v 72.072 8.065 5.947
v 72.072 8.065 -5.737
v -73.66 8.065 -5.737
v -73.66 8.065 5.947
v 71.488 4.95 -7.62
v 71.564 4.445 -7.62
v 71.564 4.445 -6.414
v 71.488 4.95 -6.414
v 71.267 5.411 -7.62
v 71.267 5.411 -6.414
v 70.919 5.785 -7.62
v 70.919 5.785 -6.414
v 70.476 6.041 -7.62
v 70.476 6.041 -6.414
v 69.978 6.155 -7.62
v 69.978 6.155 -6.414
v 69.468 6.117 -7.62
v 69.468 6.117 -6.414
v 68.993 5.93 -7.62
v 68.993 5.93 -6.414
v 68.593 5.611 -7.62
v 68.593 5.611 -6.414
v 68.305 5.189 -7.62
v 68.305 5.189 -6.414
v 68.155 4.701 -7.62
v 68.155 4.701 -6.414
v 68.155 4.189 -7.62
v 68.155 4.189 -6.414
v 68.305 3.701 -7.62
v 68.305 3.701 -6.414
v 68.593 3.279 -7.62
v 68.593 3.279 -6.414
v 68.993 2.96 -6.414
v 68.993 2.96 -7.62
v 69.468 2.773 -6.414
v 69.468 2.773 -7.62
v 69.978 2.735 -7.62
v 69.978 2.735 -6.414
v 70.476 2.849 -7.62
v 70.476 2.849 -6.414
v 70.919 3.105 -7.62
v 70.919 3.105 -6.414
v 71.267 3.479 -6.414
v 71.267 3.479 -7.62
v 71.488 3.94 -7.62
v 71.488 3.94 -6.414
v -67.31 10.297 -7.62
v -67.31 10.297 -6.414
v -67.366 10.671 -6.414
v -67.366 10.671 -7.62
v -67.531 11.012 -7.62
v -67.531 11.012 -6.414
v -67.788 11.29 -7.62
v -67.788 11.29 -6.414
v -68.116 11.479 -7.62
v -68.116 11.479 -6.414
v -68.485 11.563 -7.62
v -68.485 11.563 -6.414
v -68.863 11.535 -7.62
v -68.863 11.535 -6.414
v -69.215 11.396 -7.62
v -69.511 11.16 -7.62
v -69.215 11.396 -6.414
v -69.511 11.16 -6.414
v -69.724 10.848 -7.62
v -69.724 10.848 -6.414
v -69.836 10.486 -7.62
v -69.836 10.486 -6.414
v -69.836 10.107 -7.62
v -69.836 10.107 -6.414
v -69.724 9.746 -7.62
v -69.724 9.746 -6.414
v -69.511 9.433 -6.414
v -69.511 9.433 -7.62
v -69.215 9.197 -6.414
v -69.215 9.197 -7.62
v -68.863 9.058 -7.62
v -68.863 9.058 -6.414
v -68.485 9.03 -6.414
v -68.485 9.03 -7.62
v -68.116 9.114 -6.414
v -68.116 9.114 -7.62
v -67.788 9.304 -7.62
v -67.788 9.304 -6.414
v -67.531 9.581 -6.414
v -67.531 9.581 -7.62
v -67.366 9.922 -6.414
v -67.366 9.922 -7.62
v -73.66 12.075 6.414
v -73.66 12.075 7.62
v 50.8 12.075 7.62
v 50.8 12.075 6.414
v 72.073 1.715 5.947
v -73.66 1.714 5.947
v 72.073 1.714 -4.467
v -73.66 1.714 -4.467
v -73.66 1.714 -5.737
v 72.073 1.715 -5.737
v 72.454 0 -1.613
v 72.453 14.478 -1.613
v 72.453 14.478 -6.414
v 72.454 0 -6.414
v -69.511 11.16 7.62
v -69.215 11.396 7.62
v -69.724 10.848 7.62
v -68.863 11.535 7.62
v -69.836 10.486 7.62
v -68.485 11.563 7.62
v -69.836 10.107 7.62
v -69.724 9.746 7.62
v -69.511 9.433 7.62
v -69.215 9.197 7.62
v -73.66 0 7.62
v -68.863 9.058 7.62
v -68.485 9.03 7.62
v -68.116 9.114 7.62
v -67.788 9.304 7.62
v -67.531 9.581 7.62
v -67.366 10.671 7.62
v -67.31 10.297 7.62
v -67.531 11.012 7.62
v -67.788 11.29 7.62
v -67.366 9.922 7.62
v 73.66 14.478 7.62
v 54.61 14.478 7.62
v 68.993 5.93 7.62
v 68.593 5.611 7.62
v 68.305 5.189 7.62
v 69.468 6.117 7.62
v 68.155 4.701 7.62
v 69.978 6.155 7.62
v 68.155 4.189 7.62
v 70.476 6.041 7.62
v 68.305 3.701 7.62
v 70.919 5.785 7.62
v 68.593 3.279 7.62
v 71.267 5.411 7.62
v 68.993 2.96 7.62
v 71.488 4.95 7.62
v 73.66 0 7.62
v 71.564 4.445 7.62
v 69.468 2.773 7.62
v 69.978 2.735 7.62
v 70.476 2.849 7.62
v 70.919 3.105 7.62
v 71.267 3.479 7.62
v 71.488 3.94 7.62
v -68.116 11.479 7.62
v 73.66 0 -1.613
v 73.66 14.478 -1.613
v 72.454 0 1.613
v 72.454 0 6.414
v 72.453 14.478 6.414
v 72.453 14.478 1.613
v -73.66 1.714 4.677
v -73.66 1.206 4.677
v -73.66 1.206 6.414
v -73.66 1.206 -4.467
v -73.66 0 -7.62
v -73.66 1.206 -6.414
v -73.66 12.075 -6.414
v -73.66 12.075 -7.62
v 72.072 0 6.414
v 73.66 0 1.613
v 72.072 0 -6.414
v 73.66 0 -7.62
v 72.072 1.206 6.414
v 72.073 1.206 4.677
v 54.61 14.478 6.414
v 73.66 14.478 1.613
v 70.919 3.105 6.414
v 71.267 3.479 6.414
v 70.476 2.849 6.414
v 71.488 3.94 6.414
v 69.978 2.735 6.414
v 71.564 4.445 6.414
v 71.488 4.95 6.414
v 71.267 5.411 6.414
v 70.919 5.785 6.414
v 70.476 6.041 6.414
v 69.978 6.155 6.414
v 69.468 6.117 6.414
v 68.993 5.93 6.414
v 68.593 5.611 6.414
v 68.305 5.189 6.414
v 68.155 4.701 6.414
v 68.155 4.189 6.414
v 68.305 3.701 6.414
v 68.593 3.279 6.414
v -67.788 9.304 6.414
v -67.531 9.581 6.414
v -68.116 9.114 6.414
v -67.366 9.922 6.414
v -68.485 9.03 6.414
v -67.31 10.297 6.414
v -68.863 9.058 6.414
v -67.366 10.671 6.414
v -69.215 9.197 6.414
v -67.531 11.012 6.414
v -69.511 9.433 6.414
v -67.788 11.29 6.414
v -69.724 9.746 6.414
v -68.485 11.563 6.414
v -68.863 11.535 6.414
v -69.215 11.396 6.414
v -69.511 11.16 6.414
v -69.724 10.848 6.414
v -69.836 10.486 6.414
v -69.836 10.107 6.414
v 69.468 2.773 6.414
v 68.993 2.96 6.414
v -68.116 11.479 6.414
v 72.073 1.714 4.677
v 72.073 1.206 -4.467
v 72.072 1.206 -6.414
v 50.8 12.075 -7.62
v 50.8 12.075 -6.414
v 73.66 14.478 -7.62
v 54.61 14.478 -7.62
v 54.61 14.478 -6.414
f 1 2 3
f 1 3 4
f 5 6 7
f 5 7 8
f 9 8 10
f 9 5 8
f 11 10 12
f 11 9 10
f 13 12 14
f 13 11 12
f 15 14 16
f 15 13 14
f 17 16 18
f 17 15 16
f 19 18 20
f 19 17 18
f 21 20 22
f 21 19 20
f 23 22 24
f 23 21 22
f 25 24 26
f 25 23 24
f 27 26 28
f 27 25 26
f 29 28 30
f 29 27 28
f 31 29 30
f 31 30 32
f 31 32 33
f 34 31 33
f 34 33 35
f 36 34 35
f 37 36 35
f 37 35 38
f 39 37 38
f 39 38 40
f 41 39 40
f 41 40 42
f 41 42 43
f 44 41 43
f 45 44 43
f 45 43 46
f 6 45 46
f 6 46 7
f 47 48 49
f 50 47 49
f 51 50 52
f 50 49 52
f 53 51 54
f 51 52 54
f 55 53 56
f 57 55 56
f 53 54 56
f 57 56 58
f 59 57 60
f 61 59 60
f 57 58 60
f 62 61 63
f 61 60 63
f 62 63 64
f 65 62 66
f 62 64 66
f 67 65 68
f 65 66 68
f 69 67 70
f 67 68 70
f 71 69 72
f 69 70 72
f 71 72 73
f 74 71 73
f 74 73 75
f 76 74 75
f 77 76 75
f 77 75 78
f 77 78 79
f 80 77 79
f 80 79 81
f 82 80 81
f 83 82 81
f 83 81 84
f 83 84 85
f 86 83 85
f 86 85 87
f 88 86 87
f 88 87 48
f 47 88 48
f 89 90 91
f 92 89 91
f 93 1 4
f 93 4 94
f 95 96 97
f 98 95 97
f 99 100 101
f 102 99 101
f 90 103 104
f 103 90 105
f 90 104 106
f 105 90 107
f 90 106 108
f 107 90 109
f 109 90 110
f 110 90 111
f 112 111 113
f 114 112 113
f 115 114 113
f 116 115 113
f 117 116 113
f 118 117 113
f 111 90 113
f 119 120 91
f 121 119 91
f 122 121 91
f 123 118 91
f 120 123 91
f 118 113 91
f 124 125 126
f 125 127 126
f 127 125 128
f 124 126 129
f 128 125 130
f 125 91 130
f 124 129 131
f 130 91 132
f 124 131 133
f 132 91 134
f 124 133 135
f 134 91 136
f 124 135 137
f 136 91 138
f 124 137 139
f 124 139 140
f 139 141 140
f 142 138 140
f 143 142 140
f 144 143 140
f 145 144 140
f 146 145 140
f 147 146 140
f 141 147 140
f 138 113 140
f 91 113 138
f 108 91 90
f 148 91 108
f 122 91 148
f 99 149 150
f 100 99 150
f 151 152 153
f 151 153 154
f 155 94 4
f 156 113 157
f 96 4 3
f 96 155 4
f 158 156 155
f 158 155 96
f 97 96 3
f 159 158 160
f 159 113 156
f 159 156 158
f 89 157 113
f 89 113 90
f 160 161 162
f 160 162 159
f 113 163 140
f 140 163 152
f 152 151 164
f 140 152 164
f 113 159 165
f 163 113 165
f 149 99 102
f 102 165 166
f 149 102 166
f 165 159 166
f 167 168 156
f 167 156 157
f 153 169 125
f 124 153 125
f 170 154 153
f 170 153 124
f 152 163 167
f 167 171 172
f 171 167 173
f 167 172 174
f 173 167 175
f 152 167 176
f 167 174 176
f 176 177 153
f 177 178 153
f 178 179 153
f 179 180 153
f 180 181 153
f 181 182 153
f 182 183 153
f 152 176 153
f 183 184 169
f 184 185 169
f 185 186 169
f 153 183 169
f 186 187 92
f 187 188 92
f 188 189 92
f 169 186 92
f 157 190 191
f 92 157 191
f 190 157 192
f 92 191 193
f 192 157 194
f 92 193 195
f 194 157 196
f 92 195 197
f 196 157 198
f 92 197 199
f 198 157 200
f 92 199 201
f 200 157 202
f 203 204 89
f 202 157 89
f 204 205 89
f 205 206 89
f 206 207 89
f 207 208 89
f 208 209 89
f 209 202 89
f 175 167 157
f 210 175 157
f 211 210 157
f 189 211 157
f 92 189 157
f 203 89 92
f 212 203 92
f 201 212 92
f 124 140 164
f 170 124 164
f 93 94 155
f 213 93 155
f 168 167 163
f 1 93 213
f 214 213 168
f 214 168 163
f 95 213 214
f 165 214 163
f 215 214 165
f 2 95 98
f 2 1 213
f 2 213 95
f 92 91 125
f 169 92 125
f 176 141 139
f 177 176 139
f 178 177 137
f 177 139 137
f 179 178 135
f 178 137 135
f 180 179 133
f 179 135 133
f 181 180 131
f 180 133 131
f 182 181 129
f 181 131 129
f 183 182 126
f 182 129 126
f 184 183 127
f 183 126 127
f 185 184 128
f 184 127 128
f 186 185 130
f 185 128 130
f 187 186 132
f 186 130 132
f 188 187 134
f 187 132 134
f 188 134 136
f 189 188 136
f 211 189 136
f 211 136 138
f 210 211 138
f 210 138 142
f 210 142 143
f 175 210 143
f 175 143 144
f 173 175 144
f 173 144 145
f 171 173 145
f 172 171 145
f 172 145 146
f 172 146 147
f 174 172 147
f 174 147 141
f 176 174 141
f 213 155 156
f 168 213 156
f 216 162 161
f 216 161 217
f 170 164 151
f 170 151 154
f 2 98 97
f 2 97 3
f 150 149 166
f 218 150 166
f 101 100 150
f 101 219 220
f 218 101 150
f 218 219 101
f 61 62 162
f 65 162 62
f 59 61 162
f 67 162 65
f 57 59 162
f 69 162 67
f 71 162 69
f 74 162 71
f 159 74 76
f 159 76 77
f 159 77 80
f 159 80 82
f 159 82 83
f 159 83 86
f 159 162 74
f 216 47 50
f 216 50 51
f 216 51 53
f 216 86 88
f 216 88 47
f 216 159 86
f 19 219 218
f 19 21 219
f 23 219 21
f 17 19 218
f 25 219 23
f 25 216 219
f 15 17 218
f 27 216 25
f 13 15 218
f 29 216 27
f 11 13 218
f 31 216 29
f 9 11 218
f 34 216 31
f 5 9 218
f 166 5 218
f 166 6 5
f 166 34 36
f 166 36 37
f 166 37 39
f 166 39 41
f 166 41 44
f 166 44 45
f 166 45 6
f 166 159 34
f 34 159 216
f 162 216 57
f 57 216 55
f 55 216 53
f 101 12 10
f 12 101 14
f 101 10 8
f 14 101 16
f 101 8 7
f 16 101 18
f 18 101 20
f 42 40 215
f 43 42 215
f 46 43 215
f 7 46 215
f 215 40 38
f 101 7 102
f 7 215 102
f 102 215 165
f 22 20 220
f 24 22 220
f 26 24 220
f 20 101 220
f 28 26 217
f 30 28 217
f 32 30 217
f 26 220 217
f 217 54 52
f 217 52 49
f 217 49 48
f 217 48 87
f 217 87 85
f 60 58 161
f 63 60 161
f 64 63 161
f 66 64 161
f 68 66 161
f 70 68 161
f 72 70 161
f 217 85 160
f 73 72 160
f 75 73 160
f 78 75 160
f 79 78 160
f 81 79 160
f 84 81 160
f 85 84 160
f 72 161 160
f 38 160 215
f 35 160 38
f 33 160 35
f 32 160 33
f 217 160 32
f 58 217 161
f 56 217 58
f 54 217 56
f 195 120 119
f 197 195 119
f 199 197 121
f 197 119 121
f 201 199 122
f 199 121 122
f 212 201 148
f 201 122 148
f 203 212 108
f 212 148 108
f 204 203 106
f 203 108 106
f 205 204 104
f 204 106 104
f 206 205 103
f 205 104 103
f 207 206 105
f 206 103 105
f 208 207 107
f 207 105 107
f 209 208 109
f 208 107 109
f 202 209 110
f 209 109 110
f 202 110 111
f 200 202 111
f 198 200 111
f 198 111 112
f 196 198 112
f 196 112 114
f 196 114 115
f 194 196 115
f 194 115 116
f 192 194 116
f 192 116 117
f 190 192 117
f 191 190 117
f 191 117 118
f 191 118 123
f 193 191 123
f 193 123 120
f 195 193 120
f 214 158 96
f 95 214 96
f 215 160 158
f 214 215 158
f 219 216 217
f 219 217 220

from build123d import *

# Parameters (mm, degrees)
SKETCH1_W           = 147.32
SKETCH1_H           = 15.24
BOSS_EXTRUDE1_DEPTH = 14.478
CUT_EXTRUDE2_DEPTH  = 146.1135
CUT_EXTRUDE5_REACH  = 78.601
SKETCH7_R           = 1.7145
SKETCH9_R           = 1.27
CUT_EXTRUDE6_DEPTH  = 77.60068984
CUT_EXTRUDE7_REACH  = 76.491
SKETCH11_W          = 0.381
SKETCH11_H          = 11.684
CUT_EXTRUDE8_REACH  = 77.233
SKETCH12_W          = 0.381
SKETCH12_H          = 0.676587602
CUT_EXTRUDE9_REACH  = 77.233
SKETCH13_W          = 0.381
SKETCH13_H          = 0.466412398
CUT_EXTRUDE10_REACH = 150.226
SKETCH14_W          = 1.6129
SKETCH14_H          = 14.478


with BuildPart() as part:
    # Sketch1 → Boss-Extrude1 (new body)
    with BuildSketch(Plane(origin=(0, 0, 0), x_dir=(1, 0, 0), z_dir=(0, 1, 0))):
        Rectangle(SKETCH1_W, SKETCH1_H)
    extrude(amount=BOSS_EXTRUDE1_DEPTH)

    # Sketch3 → Cut-Extrude2 (cut)
    with BuildSketch(Plane.ZY.offset(73.66)):
        Polygon((-6.4135, 14.478), (-6.4135, 13.2715), (-6.4135, 1.2065), (-4.466912398, 1.2065), (-4.466912398, 1.7145), (-5.736912398, 1.7145), (-5.736912398, 8.0645), (5.947087602, 8.0645), (5.947087602, 1.7145), (4.677087602, 1.7145), (4.677087602, 1.2065), (6.4135, 1.2065), (6.4135, 13.2715), (6.4135, 14.478), align=None)
    extrude(amount=-CUT_EXTRUDE2_DEPTH, mode=Mode.SUBTRACT)

    # Sketch7 → Cut-Extrude5 (cut, up to next)
    with BuildSketch(Plane.XY.offset(7.62), mode=Mode.PRIVATE) as cut_extrude5_sk1:
        Polygon((50.8, 12.074646248), (54.61, 14.478), (-73.66, 14.478), (-73.66, 12.074646248), align=None)
    cut_extrude5_tool1 = extrude(cut_extrude5_sk1.sketch, amount=-CUT_EXTRUDE5_REACH, mode=Mode.PRIVATE) & part.part
    # Sketch7 → Cut-Extrude5 (cut, up to next)
    with BuildSketch(Plane.XY.offset(7.62), mode=Mode.PRIVATE) as cut_extrude5_sk2:
        with Locations((69.85, 4.445)):
            Circle(SKETCH7_R)
    cut_extrude5_tool2 = extrude(cut_extrude5_sk2.sketch, amount=-CUT_EXTRUDE5_REACH, mode=Mode.PRIVATE) & part.part
    cut_extrude5_1 = cut_extrude5_tool1.solids().sort_by_distance((-10.472714, 13.282362, 7.62))[0]
    add(cut_extrude5_1, mode=Mode.SUBTRACT)
    cut_extrude5_2 = cut_extrude5_tool2.solids().sort_by_distance((69.85, 4.445, 7.62))[0]
    add(cut_extrude5_2, mode=Mode.SUBTRACT)
    cut_extrude5 = cut_extrude5_1 + cut_extrude5_2  # Cut-Extrude5 as one shape, for the pattern or mirror that repeats it

    # Sketch9 → Cut-Extrude6 (cut, through all)
    with BuildSketch(Plane.XY.offset(7.62)):
        with Locations((-68.58, 10.296646248)):
            Circle(SKETCH9_R)
    extrude(amount=-CUT_EXTRUDE6_DEPTH, mode=Mode.SUBTRACT)

    # Sketch11 → Cut-Extrude7 (cut, up to next)
    with BuildSketch(Plane(origin=(0, 8.0645, 0), x_dir=(1, 0, 0), z_dir=(0, 1, 0)), mode=Mode.PRIVATE) as cut_extrude7_sk1:
        with Locations((72.263, -0.105087602)):
            Rectangle(SKETCH11_W, SKETCH11_H)
    cut_extrude7_tool1 = extrude(cut_extrude7_sk1.sketch, amount=-CUT_EXTRUDE7_REACH, mode=Mode.PRIVATE) & part.part
    add(cut_extrude7_tool1.solids().sort_by_distance((72.263, 8.0645, 0.105088))[0], mode=Mode.SUBTRACT)

    # Sketch12 → Cut-Extrude8 (cut, up to next)
    with BuildSketch(Plane(origin=(0, 1.2065, 0), x_dir=(1, 0, 0), z_dir=(0, 1, 0)), mode=Mode.PRIVATE) as cut_extrude8_sk1:
        with Locations((72.263, 6.075206199)):
            Rectangle(SKETCH12_W, SKETCH12_H)
    cut_extrude8_tool1 = extrude(cut_extrude8_sk1.sketch, amount=-CUT_EXTRUDE8_REACH, mode=Mode.PRIVATE) & part.part
    add(cut_extrude8_tool1.solids().sort_by_distance((72.263, 1.2065, -6.075206))[0], mode=Mode.SUBTRACT)

    # Sketch13 → Cut-Extrude9 (cut, up to next)
    with BuildSketch(Plane(origin=(0, 1.2065, 0), x_dir=(1, 0, 0), z_dir=(0, 1, 0)), mode=Mode.PRIVATE) as cut_extrude9_sk1:
        with Locations((72.263, -6.180293801)):
            Rectangle(SKETCH13_W, SKETCH13_H)
    cut_extrude9_tool1 = extrude(cut_extrude9_sk1.sketch, amount=-CUT_EXTRUDE9_REACH, mode=Mode.PRIVATE) & part.part
    add(cut_extrude9_tool1.solids().sort_by_distance((72.263, 1.2065, 6.180294))[0], mode=Mode.SUBTRACT)

    # Sketch14 → Cut-Extrude10 (cut, up to next)
    with BuildSketch(Plane(origin=(73.66, 0, 0), x_dir=(0, 0, -1), z_dir=(1, 0, 0)), mode=Mode.PRIVATE) as cut_extrude10_sk1:
        with Locations((0.80645, 7.239)):
            Rectangle(SKETCH14_W, SKETCH14_H)
    cut_extrude10_tool1 = extrude(cut_extrude10_sk1.sketch, amount=-CUT_EXTRUDE10_REACH, mode=Mode.PRIVATE) & part.part
    # Sketch14 → Cut-Extrude10 (cut, up to next)
    with BuildSketch(Plane(origin=(73.66, 0, 0), x_dir=(0, 0, -1), z_dir=(1, 0, 0)), mode=Mode.PRIVATE) as cut_extrude10_sk2:
        with Locations((-0.80645, 7.239)):
            Rectangle(SKETCH14_W, SKETCH14_H)
    cut_extrude10_tool2 = extrude(cut_extrude10_sk2.sketch, amount=-CUT_EXTRUDE10_REACH, mode=Mode.PRIVATE) & part.part
    add(cut_extrude10_tool1.solids().sort_by_distance((73.66, 7.239, -0.80645))[0], mode=Mode.SUBTRACT)
    add(cut_extrude10_tool2.solids().sort_by_distance((73.66, 7.239, 0.80645))[0], mode=Mode.SUBTRACT)

    # Mirror1: Cut-Extrude5 across plane
    add(cut_extrude5.mirror(Plane(origin=(0, 0, 0), x_dir=(1, 0, 0), z_dir=(0, 0, -1))), mode=Mode.SUBTRACT)


solid = part.part
